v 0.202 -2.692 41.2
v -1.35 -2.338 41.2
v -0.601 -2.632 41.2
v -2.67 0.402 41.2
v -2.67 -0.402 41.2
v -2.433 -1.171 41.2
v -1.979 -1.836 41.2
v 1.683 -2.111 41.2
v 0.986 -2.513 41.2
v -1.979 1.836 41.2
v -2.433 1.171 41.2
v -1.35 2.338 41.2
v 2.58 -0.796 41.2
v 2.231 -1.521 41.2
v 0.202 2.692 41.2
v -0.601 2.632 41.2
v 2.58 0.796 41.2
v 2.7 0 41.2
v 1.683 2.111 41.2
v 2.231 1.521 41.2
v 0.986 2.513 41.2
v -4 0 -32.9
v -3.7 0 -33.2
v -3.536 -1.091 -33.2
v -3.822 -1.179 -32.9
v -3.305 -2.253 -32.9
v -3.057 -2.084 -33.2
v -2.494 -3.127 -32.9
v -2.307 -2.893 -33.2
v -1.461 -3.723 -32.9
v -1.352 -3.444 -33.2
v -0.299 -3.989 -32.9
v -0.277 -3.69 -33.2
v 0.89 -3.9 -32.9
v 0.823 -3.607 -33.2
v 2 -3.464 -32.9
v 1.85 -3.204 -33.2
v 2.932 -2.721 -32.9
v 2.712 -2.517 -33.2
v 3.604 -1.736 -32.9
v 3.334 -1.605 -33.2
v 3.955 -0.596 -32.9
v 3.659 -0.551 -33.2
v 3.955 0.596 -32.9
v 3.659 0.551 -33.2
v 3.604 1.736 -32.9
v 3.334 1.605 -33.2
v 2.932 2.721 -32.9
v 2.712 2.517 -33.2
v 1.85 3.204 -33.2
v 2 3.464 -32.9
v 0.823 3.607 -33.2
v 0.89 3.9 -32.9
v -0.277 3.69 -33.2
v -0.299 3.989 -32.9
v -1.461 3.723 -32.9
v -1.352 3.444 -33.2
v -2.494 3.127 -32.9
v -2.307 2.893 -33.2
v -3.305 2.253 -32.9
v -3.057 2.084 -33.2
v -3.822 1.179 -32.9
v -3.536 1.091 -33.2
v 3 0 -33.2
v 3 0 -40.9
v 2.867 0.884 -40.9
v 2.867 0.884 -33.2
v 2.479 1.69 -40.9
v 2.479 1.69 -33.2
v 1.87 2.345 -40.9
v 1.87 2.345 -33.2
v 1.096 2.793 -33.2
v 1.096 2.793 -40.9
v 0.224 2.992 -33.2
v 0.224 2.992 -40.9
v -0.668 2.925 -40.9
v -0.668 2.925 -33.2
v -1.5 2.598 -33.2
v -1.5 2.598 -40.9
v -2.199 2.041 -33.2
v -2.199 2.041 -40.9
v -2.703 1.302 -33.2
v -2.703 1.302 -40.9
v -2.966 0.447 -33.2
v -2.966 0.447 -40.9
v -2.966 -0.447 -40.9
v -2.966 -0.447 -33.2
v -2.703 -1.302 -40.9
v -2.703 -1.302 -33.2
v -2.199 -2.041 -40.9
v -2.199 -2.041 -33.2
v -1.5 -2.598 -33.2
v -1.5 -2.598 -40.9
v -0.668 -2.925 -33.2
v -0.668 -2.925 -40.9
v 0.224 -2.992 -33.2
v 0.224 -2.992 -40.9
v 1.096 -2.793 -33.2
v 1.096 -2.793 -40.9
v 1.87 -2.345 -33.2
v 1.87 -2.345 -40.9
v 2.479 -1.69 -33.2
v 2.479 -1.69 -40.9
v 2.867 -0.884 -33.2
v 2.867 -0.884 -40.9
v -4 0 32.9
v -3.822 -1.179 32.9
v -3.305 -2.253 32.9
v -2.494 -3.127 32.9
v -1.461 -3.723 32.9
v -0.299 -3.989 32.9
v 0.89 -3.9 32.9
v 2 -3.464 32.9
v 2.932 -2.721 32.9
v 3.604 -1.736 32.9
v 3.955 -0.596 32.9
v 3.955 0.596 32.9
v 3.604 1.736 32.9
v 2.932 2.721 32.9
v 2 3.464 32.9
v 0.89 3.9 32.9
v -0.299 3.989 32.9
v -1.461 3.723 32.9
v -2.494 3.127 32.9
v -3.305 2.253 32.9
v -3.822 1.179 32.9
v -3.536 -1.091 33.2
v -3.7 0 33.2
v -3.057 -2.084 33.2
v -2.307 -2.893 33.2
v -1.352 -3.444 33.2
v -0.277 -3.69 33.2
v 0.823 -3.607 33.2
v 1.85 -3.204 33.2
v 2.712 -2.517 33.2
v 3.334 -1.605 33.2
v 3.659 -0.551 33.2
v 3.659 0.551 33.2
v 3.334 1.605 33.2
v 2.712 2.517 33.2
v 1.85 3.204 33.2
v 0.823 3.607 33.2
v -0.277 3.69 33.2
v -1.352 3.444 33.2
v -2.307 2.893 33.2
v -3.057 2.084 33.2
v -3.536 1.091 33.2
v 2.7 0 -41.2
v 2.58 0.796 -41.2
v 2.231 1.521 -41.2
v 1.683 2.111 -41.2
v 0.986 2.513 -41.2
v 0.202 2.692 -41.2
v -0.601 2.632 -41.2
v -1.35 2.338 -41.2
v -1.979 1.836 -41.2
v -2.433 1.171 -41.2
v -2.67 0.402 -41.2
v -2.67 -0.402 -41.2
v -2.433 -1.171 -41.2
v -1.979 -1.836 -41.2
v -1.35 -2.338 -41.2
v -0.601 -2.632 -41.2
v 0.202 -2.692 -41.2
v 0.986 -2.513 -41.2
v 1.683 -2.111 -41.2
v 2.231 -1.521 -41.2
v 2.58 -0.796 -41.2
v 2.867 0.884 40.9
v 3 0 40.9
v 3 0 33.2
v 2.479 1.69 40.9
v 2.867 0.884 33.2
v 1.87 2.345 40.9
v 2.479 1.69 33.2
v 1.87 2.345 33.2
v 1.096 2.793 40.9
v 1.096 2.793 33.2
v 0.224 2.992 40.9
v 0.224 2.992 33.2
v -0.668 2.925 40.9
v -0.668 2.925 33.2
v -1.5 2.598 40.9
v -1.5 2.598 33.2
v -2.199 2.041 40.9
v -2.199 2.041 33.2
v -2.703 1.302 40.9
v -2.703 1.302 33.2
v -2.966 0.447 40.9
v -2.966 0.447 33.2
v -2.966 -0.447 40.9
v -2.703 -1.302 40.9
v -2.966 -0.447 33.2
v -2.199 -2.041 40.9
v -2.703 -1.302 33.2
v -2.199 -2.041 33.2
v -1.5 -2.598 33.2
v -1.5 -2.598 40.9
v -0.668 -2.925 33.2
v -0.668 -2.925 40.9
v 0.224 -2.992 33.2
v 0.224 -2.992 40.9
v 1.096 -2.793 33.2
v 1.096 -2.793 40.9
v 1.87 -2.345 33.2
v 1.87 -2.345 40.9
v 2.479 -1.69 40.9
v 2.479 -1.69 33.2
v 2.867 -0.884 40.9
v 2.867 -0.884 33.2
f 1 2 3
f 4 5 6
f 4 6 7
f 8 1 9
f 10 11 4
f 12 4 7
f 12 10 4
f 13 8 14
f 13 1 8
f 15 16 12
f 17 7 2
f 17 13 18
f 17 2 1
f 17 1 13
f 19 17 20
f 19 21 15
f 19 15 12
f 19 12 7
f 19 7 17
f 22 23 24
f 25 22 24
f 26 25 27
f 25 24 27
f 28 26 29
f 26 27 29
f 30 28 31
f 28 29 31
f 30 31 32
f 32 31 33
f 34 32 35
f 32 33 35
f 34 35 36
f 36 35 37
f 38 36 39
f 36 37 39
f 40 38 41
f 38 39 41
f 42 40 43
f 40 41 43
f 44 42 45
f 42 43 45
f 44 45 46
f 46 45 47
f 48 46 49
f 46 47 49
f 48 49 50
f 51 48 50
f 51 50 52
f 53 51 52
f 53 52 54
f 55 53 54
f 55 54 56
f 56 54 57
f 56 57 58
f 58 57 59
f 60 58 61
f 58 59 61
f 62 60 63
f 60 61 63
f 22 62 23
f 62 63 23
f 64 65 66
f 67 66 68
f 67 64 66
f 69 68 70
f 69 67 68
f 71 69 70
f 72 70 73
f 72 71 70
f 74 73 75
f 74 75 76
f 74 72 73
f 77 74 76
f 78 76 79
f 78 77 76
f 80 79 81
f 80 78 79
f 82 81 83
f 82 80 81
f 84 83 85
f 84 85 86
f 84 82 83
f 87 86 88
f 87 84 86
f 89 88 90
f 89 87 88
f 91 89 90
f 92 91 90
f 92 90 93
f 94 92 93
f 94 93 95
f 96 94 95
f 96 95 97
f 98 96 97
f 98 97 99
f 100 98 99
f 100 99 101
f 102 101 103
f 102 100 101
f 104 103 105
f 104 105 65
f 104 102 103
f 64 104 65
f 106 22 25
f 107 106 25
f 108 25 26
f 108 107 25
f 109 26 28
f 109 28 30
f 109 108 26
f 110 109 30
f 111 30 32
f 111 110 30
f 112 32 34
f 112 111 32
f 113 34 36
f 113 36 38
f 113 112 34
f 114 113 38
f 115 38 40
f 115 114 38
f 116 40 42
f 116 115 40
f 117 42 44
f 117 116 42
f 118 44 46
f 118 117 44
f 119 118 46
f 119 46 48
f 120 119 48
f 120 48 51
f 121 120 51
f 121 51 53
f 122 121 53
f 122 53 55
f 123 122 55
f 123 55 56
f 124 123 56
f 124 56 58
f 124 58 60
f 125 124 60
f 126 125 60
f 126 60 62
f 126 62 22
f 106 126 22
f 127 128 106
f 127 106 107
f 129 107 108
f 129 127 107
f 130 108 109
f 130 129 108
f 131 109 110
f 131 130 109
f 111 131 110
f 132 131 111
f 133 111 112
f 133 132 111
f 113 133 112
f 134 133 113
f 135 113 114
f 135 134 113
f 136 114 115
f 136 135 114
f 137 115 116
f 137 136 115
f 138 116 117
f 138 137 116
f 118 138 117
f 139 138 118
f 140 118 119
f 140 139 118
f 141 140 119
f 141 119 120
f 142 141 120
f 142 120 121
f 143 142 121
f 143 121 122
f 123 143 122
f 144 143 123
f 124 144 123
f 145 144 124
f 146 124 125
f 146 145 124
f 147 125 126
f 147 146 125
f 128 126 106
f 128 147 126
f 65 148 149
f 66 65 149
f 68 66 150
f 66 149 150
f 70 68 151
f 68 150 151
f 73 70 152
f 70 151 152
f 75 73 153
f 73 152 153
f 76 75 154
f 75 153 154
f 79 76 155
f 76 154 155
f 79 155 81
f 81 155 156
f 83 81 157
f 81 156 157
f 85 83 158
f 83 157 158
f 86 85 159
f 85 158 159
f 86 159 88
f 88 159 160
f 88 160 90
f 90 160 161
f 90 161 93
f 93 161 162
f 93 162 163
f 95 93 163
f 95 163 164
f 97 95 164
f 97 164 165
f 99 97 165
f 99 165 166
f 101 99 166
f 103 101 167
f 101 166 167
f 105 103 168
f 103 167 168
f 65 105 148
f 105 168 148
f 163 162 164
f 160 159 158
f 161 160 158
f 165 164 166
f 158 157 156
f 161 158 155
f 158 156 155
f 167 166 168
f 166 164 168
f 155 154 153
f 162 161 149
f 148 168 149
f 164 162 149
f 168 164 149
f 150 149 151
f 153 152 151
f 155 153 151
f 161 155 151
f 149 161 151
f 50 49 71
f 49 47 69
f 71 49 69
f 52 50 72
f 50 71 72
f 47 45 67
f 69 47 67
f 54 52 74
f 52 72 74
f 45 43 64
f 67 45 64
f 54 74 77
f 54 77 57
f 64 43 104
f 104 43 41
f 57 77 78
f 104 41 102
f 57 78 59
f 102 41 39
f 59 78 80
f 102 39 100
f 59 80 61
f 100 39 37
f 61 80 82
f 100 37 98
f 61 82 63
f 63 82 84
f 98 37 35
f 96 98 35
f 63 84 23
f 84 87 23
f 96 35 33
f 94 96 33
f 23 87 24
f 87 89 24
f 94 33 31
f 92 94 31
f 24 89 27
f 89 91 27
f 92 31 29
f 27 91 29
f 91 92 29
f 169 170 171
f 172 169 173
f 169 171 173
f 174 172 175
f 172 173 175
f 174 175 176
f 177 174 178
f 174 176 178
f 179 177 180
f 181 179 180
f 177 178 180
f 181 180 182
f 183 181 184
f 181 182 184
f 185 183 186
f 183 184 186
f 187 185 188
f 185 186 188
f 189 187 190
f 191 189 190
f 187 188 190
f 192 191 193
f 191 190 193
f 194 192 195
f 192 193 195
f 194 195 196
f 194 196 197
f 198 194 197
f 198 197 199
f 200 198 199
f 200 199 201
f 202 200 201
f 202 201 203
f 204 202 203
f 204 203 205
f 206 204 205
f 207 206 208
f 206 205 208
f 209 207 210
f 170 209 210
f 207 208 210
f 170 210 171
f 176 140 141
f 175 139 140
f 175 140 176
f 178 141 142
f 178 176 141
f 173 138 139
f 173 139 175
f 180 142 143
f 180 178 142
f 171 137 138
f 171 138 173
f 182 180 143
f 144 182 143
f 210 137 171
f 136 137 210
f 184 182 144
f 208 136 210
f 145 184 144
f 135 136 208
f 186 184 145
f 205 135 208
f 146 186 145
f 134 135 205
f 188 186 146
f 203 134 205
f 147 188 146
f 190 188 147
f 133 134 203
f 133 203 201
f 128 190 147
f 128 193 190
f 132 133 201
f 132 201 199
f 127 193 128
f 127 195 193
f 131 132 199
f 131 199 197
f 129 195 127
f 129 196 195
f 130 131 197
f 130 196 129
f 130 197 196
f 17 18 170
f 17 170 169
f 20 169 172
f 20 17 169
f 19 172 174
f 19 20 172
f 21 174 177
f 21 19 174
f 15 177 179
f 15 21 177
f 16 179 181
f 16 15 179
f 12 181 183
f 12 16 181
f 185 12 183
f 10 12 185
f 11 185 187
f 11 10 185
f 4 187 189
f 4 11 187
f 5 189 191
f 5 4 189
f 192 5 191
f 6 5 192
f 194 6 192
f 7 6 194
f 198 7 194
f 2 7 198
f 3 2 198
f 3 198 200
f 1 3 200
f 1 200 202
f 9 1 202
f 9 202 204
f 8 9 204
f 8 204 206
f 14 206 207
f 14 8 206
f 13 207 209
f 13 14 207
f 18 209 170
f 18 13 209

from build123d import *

# Parameters (mm, degrees)
SKETCH1_R           = 4
BOSS_EXTRUDE1_DEPTH = 33.2
SKETCH2_R           = 3
BOSS_EXTRUDE2_DEPTH = 8
CHAMFER1_SIZE       = 0.3


with BuildPart() as part:
    # Sketch1 → Boss-Extrude1 (new, symmetric)
    with BuildSketch(Plane.XY):
        with Locations(Location((0, 0, 0), (0, 0, 180))):
            Circle(SKETCH1_R)
    extrude(amount=BOSS_EXTRUDE1_DEPTH, both=True)

    # Sketch2 → Boss-Extrude2 (add)
    with BuildSketch(Plane.XY.offset(33.2)):
        Circle(SKETCH2_R)
    boss_extrude2 = extrude(amount=BOSS_EXTRUDE2_DEPTH)

    # Mirror1: Boss-Extrude2 across plane
    add(boss_extrude2.mirror(Plane.XY))

    # Chamfer1
    chamfer1_edges = [part.edges().sort_by_distance(p)[0] for p in [
        (-3, 0, -41.2),
        (4, 0, -33.2),
        (4, 0, 33.2),
        (-3, 0, 41.2),
    ]]
    chamfer(chamfer1_edges, length=CHAMFER1_SIZE)


solid = part.part
